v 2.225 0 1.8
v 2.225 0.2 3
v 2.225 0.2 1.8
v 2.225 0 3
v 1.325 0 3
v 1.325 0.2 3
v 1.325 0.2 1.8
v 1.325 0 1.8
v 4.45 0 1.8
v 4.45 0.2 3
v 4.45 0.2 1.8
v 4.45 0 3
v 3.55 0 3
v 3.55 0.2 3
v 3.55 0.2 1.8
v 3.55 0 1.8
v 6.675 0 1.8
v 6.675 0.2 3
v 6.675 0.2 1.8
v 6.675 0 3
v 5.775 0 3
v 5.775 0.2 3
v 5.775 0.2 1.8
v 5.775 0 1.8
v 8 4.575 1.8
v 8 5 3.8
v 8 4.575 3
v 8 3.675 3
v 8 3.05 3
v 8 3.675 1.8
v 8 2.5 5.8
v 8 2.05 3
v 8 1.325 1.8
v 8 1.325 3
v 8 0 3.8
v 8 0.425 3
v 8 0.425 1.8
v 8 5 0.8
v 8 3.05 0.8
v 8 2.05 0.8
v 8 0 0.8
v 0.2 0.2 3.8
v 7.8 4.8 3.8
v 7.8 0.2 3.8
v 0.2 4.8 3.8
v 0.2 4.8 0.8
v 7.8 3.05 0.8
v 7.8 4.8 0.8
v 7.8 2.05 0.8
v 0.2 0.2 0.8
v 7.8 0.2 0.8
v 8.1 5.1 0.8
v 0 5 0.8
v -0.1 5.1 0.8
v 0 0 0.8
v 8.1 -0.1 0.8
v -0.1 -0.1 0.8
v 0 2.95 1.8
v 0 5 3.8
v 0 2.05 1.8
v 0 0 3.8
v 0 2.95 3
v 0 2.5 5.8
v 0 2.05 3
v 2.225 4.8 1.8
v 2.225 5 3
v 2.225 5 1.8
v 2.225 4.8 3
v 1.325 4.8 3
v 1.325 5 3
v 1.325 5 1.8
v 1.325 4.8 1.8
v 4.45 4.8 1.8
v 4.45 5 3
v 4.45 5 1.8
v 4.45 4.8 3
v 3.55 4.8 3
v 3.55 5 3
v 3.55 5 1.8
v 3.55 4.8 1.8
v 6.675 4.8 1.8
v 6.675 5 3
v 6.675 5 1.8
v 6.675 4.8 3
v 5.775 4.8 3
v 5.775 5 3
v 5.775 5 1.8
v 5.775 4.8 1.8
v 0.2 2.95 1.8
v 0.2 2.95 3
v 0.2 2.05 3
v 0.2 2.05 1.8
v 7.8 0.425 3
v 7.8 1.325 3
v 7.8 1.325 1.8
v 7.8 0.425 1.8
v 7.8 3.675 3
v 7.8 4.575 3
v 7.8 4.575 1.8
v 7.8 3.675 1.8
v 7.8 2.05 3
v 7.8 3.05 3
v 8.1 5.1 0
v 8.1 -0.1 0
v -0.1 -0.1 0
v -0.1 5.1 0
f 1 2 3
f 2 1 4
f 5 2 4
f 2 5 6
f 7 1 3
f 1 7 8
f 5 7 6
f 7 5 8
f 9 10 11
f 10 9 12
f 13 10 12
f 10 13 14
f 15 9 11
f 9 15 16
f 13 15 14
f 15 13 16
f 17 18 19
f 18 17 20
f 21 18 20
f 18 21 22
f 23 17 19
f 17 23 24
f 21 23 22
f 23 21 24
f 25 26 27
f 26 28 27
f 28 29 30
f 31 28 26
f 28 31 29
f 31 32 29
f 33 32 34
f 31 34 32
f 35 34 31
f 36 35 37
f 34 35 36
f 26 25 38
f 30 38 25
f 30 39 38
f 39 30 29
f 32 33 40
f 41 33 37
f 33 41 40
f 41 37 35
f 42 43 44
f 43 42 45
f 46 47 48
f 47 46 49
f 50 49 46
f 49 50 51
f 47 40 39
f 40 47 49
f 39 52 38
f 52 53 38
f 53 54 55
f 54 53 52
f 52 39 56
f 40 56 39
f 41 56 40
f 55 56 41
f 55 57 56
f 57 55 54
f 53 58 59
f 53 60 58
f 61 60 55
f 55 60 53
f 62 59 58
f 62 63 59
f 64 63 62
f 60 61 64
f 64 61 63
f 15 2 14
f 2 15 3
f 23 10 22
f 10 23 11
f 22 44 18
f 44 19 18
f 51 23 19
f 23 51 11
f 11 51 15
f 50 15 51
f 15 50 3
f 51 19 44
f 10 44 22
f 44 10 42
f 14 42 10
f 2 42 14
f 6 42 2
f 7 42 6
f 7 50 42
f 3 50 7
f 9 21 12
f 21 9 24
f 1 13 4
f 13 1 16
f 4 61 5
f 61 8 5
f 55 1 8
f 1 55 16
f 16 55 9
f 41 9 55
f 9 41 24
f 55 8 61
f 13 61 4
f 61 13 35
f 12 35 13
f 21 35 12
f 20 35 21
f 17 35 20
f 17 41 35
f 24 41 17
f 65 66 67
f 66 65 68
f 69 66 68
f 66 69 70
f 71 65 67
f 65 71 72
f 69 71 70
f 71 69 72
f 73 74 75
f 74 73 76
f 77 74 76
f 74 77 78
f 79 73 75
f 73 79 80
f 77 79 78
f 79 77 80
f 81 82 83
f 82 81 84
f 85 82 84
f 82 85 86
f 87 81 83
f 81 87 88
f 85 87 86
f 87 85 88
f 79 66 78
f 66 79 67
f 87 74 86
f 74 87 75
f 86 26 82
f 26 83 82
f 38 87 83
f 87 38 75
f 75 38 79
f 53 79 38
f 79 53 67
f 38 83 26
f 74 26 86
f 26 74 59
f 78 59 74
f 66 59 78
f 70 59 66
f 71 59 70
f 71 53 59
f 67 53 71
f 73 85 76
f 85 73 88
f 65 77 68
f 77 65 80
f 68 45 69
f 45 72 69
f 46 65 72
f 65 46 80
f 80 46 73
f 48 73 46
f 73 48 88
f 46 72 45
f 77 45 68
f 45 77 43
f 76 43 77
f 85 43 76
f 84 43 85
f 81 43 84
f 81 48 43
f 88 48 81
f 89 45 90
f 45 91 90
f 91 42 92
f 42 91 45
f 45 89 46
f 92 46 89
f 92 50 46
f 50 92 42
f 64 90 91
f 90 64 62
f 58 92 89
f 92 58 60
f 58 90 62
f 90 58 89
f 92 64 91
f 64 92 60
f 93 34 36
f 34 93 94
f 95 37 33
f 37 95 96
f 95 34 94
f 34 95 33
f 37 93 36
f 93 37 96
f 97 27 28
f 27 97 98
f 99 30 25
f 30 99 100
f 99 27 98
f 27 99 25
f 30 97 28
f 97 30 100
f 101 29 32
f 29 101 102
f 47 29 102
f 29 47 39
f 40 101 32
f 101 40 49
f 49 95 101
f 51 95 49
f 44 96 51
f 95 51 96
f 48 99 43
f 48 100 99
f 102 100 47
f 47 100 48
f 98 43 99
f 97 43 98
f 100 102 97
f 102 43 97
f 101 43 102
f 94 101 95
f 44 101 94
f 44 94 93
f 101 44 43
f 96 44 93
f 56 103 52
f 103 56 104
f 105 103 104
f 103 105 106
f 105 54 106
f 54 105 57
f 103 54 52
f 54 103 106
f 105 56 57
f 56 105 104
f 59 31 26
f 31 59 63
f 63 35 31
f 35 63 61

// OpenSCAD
houselenght = 8;
housewidth = 5;
househight = 3;
wallthickness = 0.2;
windowwidth = 0.9;
windowhight = 1.2;
window_y = 1;
windowcount = round(houselenght/(windowwidth*2.9));
windowindent = (houselenght-windowcount*windowwidth)/(windowcount+1);
basementhight = 0.8;
basementwidth = 0.1;
doorwidght = 1;
doorhight = 2.2;
roofhight = 2;

//basement
translate ([-basementwidth, -basementwidth, 0]){
    cube([houselenght+basementwidth*2, housewidth+basementwidth*2, basementhight]);
}
    
//left wall
difference() {
    translate([0, 0, basementhight]) {
        cube([houselenght, wallthickness, househight]);
    }
    if (windowcount>0)
        for (i = [0:windowcount-1])
            translate([windowindent+windowwidth*i+windowindent*i, -wallthickness, basementhight+window_y]) {
                cube([windowwidth, basementhight+window_y, windowhight]);
            } 
}
        
//right wall        
difference() {
    translate([0, housewidth-wallthickness, basementhight]) {
        cube([houselenght, wallthickness, househight]);
    }
    if (windowcount>0)
        for (i = [0:windowcount-1])
            translate([windowindent+windowwidth*i+windowindent*i, housewidth-wallthickness*2, basementhight+window_y]) {
                cube([windowwidth, 1, windowhight]);
            } 
}
        
//back wall        
difference() {
    translate([0, wallthickness, basementhight]) {
        cube([wallthickness, housewidth-wallthickness*2, househight]);
    }
    translate([-wallthickness, housewidth/2-windowwidth/2, basementhight+window_y]) {
        cube([1, windowwidth, windowhight]);
    } 
}        
        
//front wall
difference() {
    translate([houselenght-wallthickness, wallthickness, basementhight]) {
        cube([wallthickness, housewidth-wallthickness*2, househight]);
    }
    if (housewidth > 4) {
        translate ([houselenght-wallthickness*2, windowindent-windowwidth, basementhight+window_y]) {
            cube([1, windowwidth, windowhight]);
        }    
        translate ([houselenght-wallthickness*2, housewidth-windowindent, basementhight+window_y]) {
            cube([1, windowwidth, windowhight]);
        }    
        translate([houselenght-wallthickness*2, housewidth/2-windowwidth/2, basementhight-0.1]) {
        cube([1, doorwidght, doorhight+0.1]);        
        }
    } 
}    

//roof
translate ([0,0,basementhight+househight]) {
    rotate([90,0,90]) {
        linear_extrude(houselenght) {
            polygon(points=[[0,0],[housewidth, 0],[housewidth/2, roofhight]]);
        }    
    }
}      
